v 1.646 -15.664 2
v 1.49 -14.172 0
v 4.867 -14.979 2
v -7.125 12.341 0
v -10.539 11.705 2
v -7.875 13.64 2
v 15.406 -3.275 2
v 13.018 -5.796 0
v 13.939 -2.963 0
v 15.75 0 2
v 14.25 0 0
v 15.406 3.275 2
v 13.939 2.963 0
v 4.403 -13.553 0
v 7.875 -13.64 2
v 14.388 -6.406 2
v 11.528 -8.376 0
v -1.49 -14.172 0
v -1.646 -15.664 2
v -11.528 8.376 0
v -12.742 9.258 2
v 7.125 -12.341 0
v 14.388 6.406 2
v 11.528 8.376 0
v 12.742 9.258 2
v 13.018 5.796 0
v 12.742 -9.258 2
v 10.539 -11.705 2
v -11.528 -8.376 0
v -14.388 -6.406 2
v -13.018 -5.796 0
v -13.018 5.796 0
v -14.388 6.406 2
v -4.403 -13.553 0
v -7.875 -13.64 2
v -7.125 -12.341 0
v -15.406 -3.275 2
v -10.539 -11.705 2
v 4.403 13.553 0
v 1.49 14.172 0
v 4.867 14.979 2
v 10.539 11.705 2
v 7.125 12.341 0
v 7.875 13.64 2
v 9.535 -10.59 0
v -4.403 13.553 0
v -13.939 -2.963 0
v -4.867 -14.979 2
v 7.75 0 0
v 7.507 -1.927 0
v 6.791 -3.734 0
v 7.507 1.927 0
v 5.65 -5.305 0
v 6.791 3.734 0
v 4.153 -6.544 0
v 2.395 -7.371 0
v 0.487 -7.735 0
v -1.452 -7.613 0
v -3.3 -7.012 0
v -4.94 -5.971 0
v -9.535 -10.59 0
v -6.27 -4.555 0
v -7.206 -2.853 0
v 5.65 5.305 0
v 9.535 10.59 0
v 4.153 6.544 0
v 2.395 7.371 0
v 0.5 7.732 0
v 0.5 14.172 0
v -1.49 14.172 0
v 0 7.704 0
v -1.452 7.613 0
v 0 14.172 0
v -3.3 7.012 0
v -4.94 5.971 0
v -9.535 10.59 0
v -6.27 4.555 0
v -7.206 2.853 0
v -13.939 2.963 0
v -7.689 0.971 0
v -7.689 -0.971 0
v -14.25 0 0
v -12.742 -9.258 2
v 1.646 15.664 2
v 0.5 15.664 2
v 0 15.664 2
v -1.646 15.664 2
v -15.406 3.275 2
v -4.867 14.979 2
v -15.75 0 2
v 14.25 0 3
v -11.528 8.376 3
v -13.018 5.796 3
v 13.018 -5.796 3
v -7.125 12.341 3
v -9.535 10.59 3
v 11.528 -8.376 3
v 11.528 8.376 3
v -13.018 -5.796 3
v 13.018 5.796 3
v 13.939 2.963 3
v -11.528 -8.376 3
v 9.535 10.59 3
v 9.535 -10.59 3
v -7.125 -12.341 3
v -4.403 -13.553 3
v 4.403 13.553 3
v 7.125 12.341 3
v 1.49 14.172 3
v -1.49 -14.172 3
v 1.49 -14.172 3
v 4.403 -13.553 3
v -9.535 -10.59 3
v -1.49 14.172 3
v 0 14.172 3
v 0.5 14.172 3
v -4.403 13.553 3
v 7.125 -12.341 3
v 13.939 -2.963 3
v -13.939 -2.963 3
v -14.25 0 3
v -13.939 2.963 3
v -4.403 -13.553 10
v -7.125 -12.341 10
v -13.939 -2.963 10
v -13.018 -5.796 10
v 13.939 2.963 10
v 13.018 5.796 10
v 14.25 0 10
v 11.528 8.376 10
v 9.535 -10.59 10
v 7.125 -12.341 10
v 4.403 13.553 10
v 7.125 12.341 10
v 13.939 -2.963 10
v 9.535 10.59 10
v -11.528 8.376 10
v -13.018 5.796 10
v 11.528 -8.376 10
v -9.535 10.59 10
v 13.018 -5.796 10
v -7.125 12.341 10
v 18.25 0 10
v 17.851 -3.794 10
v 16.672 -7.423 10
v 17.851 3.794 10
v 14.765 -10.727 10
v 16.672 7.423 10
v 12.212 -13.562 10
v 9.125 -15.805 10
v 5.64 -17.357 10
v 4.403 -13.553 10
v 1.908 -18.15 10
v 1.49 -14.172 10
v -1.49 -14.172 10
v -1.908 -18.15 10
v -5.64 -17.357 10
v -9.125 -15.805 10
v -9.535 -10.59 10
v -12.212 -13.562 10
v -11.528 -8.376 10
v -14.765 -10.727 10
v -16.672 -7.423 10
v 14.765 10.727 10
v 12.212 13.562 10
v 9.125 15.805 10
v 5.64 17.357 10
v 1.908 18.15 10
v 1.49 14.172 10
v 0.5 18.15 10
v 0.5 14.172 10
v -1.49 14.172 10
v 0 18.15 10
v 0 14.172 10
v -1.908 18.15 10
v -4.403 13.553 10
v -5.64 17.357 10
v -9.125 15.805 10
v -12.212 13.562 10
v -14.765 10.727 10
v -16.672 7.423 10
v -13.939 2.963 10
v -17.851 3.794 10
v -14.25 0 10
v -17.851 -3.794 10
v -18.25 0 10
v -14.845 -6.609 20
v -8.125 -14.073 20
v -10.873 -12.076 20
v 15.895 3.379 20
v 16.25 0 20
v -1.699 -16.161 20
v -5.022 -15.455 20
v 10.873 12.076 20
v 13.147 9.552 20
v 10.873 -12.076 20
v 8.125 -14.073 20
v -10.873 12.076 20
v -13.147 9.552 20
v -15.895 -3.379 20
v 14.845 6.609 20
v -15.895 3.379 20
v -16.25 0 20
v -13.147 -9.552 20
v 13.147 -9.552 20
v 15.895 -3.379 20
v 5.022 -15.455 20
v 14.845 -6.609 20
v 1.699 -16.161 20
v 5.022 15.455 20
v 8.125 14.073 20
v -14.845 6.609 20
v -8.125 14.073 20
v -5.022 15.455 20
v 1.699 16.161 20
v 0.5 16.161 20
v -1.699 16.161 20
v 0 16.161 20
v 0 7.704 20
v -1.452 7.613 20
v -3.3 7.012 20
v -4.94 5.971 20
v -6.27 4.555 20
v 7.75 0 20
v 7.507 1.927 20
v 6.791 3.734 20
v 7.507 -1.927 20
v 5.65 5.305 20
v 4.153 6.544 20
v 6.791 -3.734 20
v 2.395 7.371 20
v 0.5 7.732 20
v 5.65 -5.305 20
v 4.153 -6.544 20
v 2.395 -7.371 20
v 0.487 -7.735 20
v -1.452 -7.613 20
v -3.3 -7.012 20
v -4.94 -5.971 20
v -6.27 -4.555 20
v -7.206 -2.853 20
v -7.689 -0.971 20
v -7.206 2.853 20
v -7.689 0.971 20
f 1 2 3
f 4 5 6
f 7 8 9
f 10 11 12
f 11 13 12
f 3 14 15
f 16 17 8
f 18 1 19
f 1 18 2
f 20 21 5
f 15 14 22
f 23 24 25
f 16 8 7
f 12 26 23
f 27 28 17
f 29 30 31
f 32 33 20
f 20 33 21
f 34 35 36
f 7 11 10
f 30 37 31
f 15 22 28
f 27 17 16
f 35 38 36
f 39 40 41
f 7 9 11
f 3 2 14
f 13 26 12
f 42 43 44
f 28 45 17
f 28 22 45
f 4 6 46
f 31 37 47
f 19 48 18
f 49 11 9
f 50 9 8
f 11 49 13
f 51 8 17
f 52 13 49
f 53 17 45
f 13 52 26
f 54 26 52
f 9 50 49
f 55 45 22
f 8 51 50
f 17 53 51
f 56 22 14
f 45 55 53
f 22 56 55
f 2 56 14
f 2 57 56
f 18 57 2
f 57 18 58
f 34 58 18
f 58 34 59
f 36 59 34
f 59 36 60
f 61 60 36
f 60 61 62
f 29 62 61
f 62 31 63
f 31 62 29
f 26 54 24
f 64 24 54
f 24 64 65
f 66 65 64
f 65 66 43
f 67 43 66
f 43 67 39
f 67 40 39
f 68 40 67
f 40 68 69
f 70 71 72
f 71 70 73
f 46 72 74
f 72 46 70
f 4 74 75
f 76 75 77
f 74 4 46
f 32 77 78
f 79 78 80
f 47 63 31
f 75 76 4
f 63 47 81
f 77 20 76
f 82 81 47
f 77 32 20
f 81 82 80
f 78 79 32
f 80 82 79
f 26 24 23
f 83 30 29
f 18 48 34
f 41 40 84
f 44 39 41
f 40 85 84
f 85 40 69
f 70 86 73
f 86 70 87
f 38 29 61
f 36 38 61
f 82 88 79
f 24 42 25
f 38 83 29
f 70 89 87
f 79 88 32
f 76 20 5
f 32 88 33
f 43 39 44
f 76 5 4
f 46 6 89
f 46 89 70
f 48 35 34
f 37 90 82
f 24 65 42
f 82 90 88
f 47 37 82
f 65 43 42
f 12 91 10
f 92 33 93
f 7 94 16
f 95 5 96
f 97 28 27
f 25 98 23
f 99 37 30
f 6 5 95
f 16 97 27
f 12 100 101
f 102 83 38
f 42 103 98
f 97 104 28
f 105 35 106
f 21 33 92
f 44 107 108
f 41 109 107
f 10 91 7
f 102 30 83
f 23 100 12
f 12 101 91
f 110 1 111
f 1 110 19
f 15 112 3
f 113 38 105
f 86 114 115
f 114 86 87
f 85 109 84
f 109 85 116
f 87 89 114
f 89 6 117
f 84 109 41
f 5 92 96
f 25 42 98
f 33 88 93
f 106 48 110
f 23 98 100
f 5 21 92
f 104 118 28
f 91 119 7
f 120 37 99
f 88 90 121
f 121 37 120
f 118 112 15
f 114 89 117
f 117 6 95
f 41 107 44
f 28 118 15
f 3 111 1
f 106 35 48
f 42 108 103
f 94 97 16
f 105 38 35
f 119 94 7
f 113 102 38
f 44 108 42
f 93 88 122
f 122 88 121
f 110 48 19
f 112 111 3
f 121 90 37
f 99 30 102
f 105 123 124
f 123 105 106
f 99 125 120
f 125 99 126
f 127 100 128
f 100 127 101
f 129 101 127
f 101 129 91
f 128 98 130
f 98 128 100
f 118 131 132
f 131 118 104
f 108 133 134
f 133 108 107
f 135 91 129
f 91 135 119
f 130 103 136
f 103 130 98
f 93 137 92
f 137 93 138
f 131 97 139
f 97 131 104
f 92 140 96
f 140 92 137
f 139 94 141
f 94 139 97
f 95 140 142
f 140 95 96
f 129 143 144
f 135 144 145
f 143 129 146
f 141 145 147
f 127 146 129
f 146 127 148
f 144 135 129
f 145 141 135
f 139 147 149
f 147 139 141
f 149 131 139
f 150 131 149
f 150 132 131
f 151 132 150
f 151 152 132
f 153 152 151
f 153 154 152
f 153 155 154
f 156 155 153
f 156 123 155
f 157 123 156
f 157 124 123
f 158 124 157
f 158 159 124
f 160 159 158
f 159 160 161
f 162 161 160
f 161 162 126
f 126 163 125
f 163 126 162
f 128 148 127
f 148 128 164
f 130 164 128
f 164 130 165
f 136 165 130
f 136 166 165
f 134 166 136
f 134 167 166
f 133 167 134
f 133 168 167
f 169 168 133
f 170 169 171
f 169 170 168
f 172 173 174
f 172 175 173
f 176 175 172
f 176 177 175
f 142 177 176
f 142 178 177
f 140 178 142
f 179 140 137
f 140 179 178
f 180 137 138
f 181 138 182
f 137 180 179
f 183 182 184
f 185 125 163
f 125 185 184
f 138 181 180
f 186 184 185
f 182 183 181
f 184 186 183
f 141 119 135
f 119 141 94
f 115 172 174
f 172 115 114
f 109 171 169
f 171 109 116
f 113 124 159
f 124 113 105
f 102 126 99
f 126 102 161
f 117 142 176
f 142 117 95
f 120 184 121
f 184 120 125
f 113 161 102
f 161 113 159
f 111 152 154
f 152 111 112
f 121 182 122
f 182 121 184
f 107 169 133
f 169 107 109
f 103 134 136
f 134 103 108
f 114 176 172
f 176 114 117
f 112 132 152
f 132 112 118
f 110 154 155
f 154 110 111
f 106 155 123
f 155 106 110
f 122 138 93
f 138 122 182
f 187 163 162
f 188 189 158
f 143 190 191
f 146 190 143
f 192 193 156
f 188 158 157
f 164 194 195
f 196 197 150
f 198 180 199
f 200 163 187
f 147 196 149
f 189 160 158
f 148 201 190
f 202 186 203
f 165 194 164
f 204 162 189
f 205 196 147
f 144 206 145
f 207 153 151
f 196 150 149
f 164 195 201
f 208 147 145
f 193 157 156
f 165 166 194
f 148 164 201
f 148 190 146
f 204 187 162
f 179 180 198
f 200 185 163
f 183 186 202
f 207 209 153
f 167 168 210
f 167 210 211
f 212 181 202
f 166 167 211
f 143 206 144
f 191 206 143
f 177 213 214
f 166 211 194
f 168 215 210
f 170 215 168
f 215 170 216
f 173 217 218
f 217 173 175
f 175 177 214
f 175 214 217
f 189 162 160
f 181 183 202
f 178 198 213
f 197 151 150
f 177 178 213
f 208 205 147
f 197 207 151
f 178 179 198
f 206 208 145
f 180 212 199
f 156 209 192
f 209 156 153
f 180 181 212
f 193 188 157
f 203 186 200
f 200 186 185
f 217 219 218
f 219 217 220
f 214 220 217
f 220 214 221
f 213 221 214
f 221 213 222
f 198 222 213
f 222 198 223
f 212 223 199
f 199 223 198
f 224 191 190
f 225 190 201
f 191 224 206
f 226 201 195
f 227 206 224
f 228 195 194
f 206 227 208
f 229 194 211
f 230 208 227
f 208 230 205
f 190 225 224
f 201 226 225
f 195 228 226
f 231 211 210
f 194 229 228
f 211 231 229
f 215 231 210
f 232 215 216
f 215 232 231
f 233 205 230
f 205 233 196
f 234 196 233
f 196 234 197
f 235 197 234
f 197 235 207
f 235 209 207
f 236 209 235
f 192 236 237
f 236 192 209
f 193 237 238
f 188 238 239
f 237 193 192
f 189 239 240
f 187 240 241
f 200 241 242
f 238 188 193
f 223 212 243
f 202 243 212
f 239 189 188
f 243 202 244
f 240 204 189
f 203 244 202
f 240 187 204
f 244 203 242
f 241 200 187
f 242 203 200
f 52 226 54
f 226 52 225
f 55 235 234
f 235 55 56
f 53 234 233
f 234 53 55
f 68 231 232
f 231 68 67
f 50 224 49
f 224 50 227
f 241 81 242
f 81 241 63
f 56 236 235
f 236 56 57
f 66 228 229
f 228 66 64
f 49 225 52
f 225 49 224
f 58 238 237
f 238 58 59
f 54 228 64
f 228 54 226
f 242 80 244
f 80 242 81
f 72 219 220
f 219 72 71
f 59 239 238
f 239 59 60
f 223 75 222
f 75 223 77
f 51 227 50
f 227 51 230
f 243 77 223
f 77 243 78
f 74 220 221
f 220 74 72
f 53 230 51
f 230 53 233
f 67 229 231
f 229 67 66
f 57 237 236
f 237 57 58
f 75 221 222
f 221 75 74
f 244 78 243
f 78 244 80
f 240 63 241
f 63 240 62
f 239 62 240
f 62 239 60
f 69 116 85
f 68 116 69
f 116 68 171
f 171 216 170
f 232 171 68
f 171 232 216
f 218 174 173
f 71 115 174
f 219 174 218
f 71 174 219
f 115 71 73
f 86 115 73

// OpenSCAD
d=28.5;
h=7;
di=15.5;

difference() {
union() {
    cylinder(d1=d,d2=d+3, h= 2);
    translate([0,0,2]) cylinder(d2=d,d1=d+3, h= 1);
    translate([0,0,3]) cylinder(d=d, h= h);
    translate([0,0,3+h]) cylinder(d1=d+2*4,d2=d+4, h= 10);
}
translate([0,0,-1])cylinder(d=di,h=h+3+10+2);
cube([.5,50,50]);
}
